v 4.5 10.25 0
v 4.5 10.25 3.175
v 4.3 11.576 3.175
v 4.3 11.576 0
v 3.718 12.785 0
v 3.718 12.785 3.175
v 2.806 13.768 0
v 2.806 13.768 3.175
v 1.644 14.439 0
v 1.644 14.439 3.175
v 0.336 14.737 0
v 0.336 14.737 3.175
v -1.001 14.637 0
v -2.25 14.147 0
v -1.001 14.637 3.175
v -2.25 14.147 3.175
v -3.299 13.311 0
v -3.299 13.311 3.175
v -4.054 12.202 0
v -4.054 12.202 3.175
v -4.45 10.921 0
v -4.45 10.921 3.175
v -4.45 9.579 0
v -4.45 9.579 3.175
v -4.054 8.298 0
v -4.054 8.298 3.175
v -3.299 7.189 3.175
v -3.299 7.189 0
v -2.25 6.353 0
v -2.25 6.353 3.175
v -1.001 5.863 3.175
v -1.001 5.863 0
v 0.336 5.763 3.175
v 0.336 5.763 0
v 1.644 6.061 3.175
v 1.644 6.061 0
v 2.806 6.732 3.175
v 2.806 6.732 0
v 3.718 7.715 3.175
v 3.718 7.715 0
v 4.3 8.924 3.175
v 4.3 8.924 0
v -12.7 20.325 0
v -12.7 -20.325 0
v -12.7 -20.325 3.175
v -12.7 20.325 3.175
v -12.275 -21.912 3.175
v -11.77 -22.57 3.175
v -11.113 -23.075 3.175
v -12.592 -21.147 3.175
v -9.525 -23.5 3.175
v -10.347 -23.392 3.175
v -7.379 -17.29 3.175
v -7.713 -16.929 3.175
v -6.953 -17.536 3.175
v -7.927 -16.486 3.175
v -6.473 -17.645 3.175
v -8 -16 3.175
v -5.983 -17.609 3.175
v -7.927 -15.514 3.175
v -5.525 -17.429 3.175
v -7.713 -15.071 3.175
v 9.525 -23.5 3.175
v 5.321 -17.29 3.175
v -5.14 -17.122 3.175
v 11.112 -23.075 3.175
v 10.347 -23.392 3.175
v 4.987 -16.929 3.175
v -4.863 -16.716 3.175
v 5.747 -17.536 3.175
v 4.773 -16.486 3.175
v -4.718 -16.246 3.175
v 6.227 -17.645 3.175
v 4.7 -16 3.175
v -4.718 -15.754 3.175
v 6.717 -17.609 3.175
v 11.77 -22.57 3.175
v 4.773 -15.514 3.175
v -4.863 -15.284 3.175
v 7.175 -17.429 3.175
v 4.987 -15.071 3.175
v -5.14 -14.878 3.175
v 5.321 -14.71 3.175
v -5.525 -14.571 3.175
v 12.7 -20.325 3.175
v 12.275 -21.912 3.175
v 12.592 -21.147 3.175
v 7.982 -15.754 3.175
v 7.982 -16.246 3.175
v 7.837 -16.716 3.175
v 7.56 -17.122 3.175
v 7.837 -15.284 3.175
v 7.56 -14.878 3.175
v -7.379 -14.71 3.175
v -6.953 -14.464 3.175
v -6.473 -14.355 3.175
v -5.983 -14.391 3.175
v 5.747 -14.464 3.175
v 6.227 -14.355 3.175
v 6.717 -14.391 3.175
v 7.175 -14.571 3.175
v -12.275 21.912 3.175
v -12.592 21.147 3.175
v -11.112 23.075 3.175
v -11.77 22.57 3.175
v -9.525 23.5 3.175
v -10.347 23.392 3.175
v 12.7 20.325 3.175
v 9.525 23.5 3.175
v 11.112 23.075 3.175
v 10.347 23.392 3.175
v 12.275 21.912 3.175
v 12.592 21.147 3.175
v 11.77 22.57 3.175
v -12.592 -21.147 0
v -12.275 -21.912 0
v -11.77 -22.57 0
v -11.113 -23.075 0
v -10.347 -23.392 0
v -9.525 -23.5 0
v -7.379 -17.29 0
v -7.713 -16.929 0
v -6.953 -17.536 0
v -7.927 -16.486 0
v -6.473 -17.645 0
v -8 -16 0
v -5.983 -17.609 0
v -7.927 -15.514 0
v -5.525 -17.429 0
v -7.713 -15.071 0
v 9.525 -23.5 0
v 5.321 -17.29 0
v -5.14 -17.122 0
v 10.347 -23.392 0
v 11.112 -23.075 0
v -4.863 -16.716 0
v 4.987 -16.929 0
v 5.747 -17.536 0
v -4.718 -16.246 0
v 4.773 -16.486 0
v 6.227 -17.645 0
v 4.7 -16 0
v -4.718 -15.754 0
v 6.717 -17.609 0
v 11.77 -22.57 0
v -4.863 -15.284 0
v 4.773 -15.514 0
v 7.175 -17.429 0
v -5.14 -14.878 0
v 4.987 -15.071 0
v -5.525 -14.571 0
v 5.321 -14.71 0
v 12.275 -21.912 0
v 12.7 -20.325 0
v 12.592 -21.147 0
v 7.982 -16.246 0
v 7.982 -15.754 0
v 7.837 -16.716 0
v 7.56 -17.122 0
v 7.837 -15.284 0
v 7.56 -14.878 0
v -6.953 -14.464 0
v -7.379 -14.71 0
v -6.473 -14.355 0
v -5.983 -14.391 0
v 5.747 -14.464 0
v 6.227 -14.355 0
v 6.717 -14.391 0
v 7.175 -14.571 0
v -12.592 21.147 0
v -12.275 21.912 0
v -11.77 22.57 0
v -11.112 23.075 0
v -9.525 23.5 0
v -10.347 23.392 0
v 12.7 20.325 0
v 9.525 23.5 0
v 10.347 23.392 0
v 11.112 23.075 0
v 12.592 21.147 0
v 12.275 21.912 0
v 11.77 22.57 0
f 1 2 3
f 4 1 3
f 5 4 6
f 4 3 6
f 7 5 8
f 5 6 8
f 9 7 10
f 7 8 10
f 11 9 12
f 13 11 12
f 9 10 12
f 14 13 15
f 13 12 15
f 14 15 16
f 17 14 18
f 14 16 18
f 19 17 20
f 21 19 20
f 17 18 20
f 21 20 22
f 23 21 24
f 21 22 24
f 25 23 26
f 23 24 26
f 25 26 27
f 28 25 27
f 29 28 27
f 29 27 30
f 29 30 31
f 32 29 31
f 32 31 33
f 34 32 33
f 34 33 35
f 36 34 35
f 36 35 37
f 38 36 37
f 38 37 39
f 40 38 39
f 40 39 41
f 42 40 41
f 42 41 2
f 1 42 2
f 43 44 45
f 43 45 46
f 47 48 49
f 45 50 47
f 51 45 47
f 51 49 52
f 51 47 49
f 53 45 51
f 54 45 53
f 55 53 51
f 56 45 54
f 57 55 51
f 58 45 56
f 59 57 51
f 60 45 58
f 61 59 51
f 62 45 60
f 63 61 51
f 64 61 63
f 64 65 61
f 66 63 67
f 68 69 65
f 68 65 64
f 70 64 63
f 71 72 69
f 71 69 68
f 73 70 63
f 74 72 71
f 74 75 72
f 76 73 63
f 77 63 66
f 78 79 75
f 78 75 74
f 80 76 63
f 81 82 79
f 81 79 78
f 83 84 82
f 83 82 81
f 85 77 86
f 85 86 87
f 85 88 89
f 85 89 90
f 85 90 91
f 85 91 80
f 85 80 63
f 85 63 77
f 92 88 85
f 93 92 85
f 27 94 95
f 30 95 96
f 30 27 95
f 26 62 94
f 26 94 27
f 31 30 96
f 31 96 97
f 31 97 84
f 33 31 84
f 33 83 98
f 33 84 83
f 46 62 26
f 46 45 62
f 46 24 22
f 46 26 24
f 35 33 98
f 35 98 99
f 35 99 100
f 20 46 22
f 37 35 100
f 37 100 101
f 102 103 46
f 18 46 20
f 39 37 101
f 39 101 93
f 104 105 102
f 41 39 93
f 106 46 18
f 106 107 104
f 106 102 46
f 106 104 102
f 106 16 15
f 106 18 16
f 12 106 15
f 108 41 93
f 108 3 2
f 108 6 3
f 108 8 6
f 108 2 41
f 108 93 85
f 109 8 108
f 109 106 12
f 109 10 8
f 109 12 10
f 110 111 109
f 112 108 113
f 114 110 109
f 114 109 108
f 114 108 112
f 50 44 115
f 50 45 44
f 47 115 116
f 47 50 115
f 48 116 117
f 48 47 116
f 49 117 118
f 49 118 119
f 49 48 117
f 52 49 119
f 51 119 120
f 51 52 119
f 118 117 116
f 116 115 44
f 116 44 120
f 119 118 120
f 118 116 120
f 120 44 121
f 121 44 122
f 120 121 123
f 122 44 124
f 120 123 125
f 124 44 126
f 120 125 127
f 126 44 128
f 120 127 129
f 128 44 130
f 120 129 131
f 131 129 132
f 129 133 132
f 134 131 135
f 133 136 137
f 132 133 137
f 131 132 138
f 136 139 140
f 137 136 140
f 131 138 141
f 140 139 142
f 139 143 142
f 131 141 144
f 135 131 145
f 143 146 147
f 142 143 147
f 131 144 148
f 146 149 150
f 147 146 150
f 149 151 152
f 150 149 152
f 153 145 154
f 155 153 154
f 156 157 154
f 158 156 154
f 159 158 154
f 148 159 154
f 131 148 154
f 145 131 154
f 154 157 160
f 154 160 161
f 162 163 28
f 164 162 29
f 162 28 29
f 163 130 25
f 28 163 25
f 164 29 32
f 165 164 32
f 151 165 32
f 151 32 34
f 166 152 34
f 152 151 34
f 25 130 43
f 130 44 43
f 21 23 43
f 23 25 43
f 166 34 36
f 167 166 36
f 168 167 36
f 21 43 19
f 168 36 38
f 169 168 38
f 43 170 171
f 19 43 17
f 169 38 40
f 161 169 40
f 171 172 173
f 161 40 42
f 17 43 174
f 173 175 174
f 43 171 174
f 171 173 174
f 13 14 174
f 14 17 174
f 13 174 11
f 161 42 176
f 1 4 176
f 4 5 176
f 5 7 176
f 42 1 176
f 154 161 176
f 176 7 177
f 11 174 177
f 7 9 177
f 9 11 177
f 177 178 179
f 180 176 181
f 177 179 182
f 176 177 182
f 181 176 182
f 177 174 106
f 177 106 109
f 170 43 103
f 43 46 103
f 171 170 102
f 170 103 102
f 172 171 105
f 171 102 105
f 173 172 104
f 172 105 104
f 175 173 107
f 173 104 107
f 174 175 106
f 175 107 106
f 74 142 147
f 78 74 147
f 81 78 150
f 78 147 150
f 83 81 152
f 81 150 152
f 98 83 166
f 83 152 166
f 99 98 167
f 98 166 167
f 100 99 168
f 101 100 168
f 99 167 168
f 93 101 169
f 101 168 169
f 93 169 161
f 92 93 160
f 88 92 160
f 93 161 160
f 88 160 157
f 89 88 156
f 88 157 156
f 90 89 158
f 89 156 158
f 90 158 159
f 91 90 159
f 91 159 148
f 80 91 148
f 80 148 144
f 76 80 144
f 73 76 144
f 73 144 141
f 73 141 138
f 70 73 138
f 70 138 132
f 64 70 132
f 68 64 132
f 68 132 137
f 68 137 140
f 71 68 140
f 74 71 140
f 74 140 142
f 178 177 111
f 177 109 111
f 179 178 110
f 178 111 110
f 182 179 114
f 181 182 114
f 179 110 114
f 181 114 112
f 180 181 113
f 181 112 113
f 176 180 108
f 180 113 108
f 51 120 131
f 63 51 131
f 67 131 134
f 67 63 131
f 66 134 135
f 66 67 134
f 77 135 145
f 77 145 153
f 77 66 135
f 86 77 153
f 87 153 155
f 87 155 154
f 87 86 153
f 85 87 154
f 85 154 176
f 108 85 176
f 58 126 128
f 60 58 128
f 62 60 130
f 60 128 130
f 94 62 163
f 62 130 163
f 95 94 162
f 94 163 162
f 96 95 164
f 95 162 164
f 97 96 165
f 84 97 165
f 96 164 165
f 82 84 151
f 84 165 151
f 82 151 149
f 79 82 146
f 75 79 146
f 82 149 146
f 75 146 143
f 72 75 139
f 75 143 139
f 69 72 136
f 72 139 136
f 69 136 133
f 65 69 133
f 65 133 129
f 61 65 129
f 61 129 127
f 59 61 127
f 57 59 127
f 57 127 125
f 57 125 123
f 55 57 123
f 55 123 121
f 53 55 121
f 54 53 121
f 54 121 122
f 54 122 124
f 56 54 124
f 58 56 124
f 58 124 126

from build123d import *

# Parameters (mm, degrees)
SKETCH1_W             = 25.4
SKETCH1_H             = 47
BOSS_EXTRUDE1_DEPTH   = 3.175
SKETCH2_R             = 4.5
CUT_EXTRUDE1_DEPTH    = 27.90019749
FILLET1_R             = 3.175
M4X0_7_TAPPED_HOLE1_D = 3.3


with BuildPart() as part:
    # Sketch1 → Boss-Extrude1 (new body)
    with BuildSketch(Plane.XY):
        Rectangle(SKETCH1_W, SKETCH1_H)
    extrude(amount=BOSS_EXTRUDE1_DEPTH)

    # Sketch2 → Cut-Extrude1 (cut, through all)
    with BuildSketch(Plane.XY.offset(3.175)):
        with Locations((0, 10.25)):
            Circle(SKETCH2_R)
    extrude(amount=-CUT_EXTRUDE1_DEPTH, mode=Mode.SUBTRACT)

    # Fillet1
    fillet1_edges = [part.edges().sort_by_distance(p)[0] for p in [
        (12.7, -23.5, 1.5875),
        (-12.7, -23.5, 1.5875),
        (-12.7, 23.5, 1.5875),
        (12.7, 23.5, 1.5875),
    ]]
    fillet(fillet1_edges, radius=FILLET1_R)

    # M4x0.7 Tapped Hole1 (through all)
    with Locations(Plane.XY.offset(3.175)):
        with Locations((-6.35, -16), (6.35, -16)):
            Hole(M4X0_7_TAPPED_HOLE1_D / 2)


solid = part.part
